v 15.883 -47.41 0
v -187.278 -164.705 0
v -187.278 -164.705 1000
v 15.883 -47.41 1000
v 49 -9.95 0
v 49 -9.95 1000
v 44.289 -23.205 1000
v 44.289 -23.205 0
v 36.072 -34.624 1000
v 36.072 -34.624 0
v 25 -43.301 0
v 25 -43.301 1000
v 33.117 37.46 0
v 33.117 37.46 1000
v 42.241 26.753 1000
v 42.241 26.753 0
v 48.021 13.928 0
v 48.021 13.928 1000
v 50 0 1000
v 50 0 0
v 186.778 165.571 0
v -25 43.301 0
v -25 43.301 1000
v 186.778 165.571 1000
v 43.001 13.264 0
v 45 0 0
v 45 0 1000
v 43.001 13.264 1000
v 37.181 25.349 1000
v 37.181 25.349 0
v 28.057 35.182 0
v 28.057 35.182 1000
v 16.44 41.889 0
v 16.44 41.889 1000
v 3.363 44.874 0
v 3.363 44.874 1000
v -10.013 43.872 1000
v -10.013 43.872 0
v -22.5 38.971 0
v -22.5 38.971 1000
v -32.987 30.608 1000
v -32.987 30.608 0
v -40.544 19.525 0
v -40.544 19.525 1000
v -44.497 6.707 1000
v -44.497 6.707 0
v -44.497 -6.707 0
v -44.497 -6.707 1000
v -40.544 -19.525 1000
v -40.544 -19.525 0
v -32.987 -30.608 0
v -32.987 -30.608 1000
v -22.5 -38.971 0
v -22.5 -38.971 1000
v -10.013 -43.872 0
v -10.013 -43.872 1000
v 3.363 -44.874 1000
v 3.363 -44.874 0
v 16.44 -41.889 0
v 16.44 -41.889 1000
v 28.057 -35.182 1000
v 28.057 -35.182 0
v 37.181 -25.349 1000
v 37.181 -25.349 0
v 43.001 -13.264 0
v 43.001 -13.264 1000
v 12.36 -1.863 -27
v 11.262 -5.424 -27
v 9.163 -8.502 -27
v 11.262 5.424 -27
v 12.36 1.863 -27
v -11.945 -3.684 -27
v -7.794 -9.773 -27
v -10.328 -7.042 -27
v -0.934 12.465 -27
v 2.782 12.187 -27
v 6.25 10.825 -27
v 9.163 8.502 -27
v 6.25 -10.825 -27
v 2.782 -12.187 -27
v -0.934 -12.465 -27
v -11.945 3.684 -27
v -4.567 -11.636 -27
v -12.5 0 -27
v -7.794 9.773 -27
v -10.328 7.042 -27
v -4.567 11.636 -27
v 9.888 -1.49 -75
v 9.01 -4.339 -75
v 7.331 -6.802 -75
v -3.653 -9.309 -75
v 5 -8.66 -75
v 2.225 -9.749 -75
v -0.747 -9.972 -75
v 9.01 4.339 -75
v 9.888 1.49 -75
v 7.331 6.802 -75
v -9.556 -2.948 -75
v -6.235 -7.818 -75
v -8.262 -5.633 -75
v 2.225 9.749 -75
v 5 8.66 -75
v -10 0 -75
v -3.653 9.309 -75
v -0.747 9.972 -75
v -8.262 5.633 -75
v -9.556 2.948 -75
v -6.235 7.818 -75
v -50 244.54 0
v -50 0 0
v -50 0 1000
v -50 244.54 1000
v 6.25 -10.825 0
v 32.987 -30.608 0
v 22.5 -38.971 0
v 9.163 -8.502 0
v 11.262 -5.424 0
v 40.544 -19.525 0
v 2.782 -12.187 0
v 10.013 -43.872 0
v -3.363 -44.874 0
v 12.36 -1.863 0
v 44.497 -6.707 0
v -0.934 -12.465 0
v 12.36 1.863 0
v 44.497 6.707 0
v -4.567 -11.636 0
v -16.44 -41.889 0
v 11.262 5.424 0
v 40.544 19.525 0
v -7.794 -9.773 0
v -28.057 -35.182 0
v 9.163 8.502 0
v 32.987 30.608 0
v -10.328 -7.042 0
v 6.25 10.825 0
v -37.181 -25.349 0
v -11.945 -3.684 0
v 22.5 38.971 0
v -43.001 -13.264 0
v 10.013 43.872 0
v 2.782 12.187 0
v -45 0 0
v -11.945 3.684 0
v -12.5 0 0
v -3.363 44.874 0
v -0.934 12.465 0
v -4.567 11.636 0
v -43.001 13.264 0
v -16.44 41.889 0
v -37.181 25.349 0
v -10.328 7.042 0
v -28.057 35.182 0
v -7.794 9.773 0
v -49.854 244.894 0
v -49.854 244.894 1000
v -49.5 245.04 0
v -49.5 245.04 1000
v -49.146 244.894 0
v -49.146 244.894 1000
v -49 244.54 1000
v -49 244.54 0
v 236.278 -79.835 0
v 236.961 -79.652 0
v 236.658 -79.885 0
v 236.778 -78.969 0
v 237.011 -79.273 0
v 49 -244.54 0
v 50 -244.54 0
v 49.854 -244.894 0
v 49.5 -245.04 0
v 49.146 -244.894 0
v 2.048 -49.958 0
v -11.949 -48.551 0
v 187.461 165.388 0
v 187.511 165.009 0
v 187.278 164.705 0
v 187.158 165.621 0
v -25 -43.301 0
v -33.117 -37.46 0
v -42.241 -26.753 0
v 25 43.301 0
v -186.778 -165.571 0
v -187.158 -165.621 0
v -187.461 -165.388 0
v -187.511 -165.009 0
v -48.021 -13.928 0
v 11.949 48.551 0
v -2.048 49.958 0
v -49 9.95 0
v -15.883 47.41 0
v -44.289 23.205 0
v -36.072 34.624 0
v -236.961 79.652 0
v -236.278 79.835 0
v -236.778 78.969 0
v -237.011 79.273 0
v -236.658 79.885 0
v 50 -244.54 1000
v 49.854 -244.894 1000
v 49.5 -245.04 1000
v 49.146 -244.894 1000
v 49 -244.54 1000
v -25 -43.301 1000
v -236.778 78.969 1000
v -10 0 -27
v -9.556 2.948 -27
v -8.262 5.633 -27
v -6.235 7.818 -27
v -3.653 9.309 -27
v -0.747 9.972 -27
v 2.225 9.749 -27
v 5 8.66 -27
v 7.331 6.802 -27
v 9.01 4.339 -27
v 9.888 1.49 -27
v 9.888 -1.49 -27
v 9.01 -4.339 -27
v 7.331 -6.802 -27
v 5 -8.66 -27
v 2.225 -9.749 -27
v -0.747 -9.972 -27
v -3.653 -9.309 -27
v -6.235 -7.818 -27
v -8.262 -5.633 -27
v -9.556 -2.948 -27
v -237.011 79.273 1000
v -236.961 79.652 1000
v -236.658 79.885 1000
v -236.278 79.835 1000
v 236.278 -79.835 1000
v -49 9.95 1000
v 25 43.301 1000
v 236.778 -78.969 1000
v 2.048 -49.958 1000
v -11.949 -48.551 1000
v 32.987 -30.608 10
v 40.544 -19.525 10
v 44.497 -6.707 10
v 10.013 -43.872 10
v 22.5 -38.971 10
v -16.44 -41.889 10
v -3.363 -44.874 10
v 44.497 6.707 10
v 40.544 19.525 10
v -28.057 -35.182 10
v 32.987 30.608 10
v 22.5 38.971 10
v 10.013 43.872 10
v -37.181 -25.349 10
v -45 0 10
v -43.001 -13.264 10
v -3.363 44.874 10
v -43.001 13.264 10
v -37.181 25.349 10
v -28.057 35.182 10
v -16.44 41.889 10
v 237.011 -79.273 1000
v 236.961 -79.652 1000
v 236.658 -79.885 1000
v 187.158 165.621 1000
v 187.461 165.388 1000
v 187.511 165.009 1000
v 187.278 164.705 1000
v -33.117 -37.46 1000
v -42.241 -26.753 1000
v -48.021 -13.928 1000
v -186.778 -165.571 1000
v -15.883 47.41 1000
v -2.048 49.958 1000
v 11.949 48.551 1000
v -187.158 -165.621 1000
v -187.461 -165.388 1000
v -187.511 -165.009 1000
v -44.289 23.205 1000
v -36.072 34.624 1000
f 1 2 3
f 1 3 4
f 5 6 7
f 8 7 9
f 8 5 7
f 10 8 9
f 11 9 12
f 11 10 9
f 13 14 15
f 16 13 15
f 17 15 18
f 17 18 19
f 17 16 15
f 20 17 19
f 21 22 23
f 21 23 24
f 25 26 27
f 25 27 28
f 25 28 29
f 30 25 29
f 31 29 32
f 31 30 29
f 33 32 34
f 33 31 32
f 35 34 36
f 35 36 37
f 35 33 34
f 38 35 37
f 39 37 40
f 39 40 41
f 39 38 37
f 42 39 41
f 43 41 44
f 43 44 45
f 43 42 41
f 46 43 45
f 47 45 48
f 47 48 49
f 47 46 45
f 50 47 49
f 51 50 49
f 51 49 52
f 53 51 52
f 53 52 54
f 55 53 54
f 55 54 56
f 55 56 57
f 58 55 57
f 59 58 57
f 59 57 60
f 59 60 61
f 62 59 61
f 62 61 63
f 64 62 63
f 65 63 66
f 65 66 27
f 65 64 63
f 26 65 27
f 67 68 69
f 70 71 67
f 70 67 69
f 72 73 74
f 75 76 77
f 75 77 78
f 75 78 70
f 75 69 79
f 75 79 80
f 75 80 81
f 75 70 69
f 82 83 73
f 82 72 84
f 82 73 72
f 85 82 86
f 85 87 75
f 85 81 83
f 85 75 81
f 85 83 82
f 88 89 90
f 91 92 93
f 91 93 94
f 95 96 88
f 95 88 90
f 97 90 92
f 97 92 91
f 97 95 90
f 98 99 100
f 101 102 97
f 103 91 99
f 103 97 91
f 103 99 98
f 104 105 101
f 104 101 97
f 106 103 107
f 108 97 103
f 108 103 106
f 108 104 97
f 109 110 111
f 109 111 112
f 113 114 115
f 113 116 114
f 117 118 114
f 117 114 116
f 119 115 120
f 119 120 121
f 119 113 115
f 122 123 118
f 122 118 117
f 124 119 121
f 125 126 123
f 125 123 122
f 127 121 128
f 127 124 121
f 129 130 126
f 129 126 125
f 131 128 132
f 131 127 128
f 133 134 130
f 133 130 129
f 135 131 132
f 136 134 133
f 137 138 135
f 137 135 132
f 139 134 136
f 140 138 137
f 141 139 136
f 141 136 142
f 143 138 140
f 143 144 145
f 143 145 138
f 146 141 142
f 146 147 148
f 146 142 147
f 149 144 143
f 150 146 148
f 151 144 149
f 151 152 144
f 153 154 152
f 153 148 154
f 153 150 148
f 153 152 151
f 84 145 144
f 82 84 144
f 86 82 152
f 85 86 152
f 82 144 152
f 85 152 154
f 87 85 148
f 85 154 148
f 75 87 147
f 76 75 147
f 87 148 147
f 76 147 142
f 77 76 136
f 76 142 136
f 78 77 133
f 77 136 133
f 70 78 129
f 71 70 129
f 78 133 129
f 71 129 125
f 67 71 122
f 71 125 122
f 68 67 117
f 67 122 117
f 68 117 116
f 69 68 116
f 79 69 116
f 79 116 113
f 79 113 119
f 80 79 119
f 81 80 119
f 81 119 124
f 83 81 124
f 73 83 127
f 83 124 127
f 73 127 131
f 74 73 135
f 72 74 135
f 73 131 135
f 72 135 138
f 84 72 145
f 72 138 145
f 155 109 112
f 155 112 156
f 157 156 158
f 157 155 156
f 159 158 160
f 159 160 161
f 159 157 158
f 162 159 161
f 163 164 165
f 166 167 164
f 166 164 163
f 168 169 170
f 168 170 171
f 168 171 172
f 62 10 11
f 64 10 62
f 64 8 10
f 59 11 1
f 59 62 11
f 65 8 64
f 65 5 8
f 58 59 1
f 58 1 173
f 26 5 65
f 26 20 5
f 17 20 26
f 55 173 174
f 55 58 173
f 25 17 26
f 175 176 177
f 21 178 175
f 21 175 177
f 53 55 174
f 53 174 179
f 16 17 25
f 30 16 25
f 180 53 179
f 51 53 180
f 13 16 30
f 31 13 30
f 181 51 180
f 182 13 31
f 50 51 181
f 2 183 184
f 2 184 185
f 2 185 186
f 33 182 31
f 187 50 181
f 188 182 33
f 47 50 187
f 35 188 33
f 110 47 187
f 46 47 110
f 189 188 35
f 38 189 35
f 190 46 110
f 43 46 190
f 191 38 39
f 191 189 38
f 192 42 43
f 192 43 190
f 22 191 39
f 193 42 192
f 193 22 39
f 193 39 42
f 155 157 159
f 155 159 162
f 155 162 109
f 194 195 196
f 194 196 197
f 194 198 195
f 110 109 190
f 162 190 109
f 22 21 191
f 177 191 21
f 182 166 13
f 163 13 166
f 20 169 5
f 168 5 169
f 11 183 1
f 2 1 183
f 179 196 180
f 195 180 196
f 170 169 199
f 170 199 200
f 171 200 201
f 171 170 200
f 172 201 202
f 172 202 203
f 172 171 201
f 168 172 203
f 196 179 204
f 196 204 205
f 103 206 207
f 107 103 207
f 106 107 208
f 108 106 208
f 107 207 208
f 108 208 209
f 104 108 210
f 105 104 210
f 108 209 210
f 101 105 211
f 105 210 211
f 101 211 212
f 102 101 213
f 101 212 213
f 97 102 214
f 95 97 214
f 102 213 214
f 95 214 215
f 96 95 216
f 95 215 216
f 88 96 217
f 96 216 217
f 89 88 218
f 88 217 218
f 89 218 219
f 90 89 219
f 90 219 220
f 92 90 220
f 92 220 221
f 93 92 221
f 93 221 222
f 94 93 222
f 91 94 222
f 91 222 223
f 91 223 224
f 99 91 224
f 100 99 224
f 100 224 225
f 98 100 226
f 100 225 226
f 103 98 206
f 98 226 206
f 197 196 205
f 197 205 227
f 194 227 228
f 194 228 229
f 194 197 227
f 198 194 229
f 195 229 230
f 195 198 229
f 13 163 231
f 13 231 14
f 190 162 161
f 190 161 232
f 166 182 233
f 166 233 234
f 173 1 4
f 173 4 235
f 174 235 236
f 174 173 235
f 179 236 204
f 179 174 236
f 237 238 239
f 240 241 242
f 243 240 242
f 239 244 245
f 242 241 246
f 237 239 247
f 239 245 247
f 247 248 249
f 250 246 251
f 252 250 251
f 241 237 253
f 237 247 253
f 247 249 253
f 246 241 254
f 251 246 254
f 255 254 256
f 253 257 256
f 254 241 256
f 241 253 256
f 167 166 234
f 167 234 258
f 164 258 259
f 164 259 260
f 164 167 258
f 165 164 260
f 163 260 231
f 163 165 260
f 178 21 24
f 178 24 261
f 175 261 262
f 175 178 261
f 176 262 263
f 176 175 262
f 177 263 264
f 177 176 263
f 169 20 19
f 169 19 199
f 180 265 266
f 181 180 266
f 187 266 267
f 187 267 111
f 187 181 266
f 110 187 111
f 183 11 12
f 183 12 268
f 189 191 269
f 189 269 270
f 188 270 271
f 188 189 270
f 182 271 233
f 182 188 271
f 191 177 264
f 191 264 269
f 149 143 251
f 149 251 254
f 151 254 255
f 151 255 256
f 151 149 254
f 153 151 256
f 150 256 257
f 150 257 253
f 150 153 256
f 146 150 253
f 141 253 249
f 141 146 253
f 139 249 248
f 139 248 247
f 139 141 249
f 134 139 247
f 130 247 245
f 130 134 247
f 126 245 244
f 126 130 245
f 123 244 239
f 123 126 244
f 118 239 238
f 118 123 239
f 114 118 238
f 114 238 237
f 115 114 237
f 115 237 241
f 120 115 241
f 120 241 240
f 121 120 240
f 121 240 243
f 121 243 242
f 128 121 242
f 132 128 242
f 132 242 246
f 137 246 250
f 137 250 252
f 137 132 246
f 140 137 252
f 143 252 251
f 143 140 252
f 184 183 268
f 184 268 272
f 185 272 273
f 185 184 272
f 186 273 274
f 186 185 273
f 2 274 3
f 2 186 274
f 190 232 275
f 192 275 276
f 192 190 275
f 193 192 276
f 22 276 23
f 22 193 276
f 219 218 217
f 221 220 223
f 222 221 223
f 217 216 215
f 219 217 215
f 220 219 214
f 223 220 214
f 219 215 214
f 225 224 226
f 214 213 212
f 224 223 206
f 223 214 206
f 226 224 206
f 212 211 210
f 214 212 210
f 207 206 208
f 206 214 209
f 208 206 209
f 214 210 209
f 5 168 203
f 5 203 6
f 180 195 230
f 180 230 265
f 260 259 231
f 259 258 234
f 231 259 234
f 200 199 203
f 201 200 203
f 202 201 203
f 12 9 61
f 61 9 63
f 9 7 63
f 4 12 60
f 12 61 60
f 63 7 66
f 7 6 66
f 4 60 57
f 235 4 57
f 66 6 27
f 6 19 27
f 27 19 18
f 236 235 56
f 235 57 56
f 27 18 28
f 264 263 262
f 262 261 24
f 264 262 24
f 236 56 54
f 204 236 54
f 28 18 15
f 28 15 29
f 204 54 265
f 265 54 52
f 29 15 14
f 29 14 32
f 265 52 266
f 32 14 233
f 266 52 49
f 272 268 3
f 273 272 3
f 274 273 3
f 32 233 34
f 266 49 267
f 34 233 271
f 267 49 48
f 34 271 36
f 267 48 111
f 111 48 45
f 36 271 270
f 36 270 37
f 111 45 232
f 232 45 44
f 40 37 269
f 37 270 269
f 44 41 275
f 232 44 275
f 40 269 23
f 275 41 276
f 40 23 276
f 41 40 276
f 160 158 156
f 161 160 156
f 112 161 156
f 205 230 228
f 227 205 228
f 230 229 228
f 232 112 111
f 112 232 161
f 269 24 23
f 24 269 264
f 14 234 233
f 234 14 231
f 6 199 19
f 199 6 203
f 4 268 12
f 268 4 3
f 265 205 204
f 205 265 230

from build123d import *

# Parameters (mm, degrees)
SKETCH2_R           = 45
BOSS_EXTRUDE1_DEPTH = 1000
SKETCH3_R           = 12.5
BOSS_EXTRUDE2_DEPTH = 27
SKETCH4_R           = 10
BOSS_EXTRUDE3_DEPTH = 48
SKETCH12_R          = 45
BOSS_EXTRUDE4_DEPTH = 10


with BuildPart() as part:
    # Sketch2 → Boss-Extrude1 (new body)
    with BuildSketch(Plane.XY):
        with BuildLine():
            Line((-50, 0), (-50, 244.540385213))
            ThreePointArc((-50, 244.540385213), (-49.5, 245.040385213), (-49, 244.540385213))
            Line((-49, 244.540385213), (-49, 9.949874371))
            ThreePointArc((-49, 9.949874371), (-40.584219849, 29.204812947), (-25, 43.301270189))
            Line((-25, 43.301270189), (186.778185845, 165.571462796))
            ThreePointArc((186.778185845, 165.571462796), (187.461198547, 165.388450094), (187.278185845, 164.705437392))
            Line((187.278185845, 164.705437392), (-15.88315603, 47.410181971))
            ThreePointArc((-15.88315603, 47.410181971), (5, 49.749371855), (25, 43.301270189))
            Line((25, 43.301270189), (236.778185845, -78.968922417))
            ThreePointArc((236.778185845, -78.968922417), (236.961198547, -79.651935119), (236.278185845, -79.834947821))
            Line((236.278185845, -79.834947821), (33.11684397, 37.4603076))
            ThreePointArc((33.11684397, 37.4603076), (45.584219849, 20.544558909), (50, 0))
            Line((50, 0), (50, -244.540385213))
            ThreePointArc((50, -244.540385213), (49.5, -245.040385213), (49, -244.540385213))
            Line((49, -244.540385213), (49, -9.949874371))
            ThreePointArc((49, -9.949874371), (40.584219849, -29.204812947), (25, -43.301270189))
            Line((25, -43.301270189), (-186.778185845, -165.571462796))
            ThreePointArc((-186.778185845, -165.571462796), (-187.461198547, -165.388450094), (-187.278185845, -164.705437392))
            Line((-187.278185845, -164.705437392), (15.88315603, -47.410181971))
            ThreePointArc((15.88315603, -47.410181971), (-5, -49.749371855), (-25, -43.301270189))
            Line((-25, -43.301270189), (-236.778185845, 78.968922417))
            ThreePointArc((-236.778185845, 78.968922417), (-236.961198547, 79.651935119), (-236.278185845, 79.834947821))
            Line((-236.278185845, 79.834947821), (-33.11684397, -37.4603076))
            ThreePointArc((-33.11684397, -37.4603076), (-45.584219849, -20.544558909), (-50, 0))
        make_face()
        Circle(SKETCH2_R, mode=Mode.SUBTRACT)
    extrude(amount=BOSS_EXTRUDE1_DEPTH)


with BuildPart() as body_2:
    # Sketch3 → Boss-Extrude2 (new body)
    with BuildSketch(Plane(origin=(0, 0, 0), x_dir=(-1, 0, 0), z_dir=(0, 0, -1))):
        Circle(SKETCH3_R)
    extrude(amount=BOSS_EXTRUDE2_DEPTH)

    # Sketch12 → Boss-Extrude4 (add)
    with BuildSketch(Plane(origin=(0, 0, 0), x_dir=(-1, 0, 0), z_dir=(0, 0, -1))):
        Circle(SKETCH12_R)
    extrude(amount=-BOSS_EXTRUDE4_DEPTH)


with BuildPart() as body_3:
    # Sketch4 → Boss-Extrude3 (new body)
    with BuildSketch(Plane(origin=(0, 0, -27), x_dir=(-1, 0, 0), z_dir=(0, 0, -1))):
        Circle(SKETCH4_R)
    extrude(amount=BOSS_EXTRUDE3_DEPTH)


solid = Compound([part.part, body_2.part, body_3.part])
